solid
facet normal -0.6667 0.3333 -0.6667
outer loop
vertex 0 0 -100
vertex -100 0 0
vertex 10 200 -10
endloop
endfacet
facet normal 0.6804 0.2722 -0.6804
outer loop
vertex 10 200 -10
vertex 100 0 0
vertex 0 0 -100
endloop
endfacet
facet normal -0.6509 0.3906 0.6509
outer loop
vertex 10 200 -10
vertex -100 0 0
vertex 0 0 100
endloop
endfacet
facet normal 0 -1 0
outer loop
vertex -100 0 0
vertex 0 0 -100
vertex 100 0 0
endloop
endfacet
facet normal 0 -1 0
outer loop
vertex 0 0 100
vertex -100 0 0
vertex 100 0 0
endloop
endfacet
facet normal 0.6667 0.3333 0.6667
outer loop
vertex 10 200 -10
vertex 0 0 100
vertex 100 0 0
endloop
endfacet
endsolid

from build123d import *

# Parameters (mm, degrees)
EXTRUDE_1_DEPTH = 200


# Read off the part's stored shape, not the designer's step: 本體-刪除/保留 2, 本體-刪除/保留 3, 本體-刪除/保留 4
with BuildPart() as part:
    # 草圖1 → 填料-伸長1 (new body)
    with BuildSketch(Plane(origin=(0, 0, 0), x_dir=(1, 0, 0), z_dir=(0, 1, 0))):
        Polygon((0, 100), (-100, 0), (0, -100), (100, 0), align=None)
    extrude(amount=EXTRUDE_1_DEPTH)


with BuildPart() as body_2:
    # Split Bodies 2: the piece on the far side of the plane
    add(part.part)
    split(bisect_by=Plane(origin=(-44.444444444, 22.222222222, -44.444444444), x_dir=(0.7071067811865474, 0, -0.7071067811865479), z_dir=(-0.666666666666667, 0.33333333333333337, -0.6666666666666665)), keep=Keep.BOTTOM)


with BuildPart() as part_1:
    add(part.part)

    # Split Bodies 2
    split(bisect_by=Plane(origin=(-44.444444444, 22.222222222, -44.444444444), x_dir=(0.7071067811865474, 0, -0.7071067811865479), z_dir=(-0.666666666666667, 0.33333333333333337, -0.6666666666666665)), keep=Keep.TOP)


with BuildPart() as body_2_2:
    # Split Bodies 3: the piece on the far side of the plane
    add(body_2.part)
    split(bisect_by=Plane(origin=(-42.372881356, 25.423728814, 42.372881356), x_dir=(0.7071067811865476, 0, 0.7071067811865476), z_dir=(-0.6509445549041194, 0.39056673294247174, 0.6509445549041194)), keep=Keep.BOTTOM)


with BuildPart() as body_2_1:
    add(body_2.part)

    # Split Bodies 3
    split(bisect_by=Plane(origin=(-42.372881356, 25.423728814, 42.372881356), x_dir=(0.7071067811865476, 0, 0.7071067811865476), z_dir=(-0.6509445549041194, 0.39056673294247174, 0.6509445549041194)), keep=Keep.TOP)


with BuildPart() as body_2_3:
    # Split Bodies 4: the piece on the far side of the plane
    add(body_2_2.part)
    split(bisect_by=Plane(origin=(44.444444444, 22.222222222, 44.444444444), x_dir=(0.7071067811865479, 0, -0.7071067811865474), z_dir=(0.6666666666666665, 0.33333333333333337, 0.666666666666667)), keep=Keep.BOTTOM)


with BuildPart() as body_2_2_1:
    add(body_2_2.part)

    # Split Bodies 4
    split(bisect_by=Plane(origin=(44.444444444, 22.222222222, 44.444444444), x_dir=(0.7071067811865479, 0, -0.7071067811865474), z_dir=(0.6666666666666665, 0.33333333333333337, 0.666666666666667)), keep=Keep.TOP)


with BuildPart() as body_2_4:
    # Split Bodies 5: the piece on the far side of the plane
    add(body_2_3.part)
    split(bisect_by=Plane(origin=(46.296296296, 18.518518519, -46.296296296), x_dir=(-0.7071067811865475, 0, -0.7071067811865477), z_dir=(-0.6804138174397718, -0.2721655269759089, 0.6804138174397716)), keep=Keep.BOTTOM)


with BuildPart() as body_2_3_1:
    add(body_2_3.part)

    # Split Bodies 5
    split(bisect_by=Plane(origin=(46.296296296, 18.518518519, -46.296296296), x_dir=(-0.7071067811865475, 0, -0.7071067811865477), z_dir=(-0.6804138174397718, -0.2721655269759089, 0.6804138174397716)), keep=Keep.TOP)


solid = body_2_3_1.part
